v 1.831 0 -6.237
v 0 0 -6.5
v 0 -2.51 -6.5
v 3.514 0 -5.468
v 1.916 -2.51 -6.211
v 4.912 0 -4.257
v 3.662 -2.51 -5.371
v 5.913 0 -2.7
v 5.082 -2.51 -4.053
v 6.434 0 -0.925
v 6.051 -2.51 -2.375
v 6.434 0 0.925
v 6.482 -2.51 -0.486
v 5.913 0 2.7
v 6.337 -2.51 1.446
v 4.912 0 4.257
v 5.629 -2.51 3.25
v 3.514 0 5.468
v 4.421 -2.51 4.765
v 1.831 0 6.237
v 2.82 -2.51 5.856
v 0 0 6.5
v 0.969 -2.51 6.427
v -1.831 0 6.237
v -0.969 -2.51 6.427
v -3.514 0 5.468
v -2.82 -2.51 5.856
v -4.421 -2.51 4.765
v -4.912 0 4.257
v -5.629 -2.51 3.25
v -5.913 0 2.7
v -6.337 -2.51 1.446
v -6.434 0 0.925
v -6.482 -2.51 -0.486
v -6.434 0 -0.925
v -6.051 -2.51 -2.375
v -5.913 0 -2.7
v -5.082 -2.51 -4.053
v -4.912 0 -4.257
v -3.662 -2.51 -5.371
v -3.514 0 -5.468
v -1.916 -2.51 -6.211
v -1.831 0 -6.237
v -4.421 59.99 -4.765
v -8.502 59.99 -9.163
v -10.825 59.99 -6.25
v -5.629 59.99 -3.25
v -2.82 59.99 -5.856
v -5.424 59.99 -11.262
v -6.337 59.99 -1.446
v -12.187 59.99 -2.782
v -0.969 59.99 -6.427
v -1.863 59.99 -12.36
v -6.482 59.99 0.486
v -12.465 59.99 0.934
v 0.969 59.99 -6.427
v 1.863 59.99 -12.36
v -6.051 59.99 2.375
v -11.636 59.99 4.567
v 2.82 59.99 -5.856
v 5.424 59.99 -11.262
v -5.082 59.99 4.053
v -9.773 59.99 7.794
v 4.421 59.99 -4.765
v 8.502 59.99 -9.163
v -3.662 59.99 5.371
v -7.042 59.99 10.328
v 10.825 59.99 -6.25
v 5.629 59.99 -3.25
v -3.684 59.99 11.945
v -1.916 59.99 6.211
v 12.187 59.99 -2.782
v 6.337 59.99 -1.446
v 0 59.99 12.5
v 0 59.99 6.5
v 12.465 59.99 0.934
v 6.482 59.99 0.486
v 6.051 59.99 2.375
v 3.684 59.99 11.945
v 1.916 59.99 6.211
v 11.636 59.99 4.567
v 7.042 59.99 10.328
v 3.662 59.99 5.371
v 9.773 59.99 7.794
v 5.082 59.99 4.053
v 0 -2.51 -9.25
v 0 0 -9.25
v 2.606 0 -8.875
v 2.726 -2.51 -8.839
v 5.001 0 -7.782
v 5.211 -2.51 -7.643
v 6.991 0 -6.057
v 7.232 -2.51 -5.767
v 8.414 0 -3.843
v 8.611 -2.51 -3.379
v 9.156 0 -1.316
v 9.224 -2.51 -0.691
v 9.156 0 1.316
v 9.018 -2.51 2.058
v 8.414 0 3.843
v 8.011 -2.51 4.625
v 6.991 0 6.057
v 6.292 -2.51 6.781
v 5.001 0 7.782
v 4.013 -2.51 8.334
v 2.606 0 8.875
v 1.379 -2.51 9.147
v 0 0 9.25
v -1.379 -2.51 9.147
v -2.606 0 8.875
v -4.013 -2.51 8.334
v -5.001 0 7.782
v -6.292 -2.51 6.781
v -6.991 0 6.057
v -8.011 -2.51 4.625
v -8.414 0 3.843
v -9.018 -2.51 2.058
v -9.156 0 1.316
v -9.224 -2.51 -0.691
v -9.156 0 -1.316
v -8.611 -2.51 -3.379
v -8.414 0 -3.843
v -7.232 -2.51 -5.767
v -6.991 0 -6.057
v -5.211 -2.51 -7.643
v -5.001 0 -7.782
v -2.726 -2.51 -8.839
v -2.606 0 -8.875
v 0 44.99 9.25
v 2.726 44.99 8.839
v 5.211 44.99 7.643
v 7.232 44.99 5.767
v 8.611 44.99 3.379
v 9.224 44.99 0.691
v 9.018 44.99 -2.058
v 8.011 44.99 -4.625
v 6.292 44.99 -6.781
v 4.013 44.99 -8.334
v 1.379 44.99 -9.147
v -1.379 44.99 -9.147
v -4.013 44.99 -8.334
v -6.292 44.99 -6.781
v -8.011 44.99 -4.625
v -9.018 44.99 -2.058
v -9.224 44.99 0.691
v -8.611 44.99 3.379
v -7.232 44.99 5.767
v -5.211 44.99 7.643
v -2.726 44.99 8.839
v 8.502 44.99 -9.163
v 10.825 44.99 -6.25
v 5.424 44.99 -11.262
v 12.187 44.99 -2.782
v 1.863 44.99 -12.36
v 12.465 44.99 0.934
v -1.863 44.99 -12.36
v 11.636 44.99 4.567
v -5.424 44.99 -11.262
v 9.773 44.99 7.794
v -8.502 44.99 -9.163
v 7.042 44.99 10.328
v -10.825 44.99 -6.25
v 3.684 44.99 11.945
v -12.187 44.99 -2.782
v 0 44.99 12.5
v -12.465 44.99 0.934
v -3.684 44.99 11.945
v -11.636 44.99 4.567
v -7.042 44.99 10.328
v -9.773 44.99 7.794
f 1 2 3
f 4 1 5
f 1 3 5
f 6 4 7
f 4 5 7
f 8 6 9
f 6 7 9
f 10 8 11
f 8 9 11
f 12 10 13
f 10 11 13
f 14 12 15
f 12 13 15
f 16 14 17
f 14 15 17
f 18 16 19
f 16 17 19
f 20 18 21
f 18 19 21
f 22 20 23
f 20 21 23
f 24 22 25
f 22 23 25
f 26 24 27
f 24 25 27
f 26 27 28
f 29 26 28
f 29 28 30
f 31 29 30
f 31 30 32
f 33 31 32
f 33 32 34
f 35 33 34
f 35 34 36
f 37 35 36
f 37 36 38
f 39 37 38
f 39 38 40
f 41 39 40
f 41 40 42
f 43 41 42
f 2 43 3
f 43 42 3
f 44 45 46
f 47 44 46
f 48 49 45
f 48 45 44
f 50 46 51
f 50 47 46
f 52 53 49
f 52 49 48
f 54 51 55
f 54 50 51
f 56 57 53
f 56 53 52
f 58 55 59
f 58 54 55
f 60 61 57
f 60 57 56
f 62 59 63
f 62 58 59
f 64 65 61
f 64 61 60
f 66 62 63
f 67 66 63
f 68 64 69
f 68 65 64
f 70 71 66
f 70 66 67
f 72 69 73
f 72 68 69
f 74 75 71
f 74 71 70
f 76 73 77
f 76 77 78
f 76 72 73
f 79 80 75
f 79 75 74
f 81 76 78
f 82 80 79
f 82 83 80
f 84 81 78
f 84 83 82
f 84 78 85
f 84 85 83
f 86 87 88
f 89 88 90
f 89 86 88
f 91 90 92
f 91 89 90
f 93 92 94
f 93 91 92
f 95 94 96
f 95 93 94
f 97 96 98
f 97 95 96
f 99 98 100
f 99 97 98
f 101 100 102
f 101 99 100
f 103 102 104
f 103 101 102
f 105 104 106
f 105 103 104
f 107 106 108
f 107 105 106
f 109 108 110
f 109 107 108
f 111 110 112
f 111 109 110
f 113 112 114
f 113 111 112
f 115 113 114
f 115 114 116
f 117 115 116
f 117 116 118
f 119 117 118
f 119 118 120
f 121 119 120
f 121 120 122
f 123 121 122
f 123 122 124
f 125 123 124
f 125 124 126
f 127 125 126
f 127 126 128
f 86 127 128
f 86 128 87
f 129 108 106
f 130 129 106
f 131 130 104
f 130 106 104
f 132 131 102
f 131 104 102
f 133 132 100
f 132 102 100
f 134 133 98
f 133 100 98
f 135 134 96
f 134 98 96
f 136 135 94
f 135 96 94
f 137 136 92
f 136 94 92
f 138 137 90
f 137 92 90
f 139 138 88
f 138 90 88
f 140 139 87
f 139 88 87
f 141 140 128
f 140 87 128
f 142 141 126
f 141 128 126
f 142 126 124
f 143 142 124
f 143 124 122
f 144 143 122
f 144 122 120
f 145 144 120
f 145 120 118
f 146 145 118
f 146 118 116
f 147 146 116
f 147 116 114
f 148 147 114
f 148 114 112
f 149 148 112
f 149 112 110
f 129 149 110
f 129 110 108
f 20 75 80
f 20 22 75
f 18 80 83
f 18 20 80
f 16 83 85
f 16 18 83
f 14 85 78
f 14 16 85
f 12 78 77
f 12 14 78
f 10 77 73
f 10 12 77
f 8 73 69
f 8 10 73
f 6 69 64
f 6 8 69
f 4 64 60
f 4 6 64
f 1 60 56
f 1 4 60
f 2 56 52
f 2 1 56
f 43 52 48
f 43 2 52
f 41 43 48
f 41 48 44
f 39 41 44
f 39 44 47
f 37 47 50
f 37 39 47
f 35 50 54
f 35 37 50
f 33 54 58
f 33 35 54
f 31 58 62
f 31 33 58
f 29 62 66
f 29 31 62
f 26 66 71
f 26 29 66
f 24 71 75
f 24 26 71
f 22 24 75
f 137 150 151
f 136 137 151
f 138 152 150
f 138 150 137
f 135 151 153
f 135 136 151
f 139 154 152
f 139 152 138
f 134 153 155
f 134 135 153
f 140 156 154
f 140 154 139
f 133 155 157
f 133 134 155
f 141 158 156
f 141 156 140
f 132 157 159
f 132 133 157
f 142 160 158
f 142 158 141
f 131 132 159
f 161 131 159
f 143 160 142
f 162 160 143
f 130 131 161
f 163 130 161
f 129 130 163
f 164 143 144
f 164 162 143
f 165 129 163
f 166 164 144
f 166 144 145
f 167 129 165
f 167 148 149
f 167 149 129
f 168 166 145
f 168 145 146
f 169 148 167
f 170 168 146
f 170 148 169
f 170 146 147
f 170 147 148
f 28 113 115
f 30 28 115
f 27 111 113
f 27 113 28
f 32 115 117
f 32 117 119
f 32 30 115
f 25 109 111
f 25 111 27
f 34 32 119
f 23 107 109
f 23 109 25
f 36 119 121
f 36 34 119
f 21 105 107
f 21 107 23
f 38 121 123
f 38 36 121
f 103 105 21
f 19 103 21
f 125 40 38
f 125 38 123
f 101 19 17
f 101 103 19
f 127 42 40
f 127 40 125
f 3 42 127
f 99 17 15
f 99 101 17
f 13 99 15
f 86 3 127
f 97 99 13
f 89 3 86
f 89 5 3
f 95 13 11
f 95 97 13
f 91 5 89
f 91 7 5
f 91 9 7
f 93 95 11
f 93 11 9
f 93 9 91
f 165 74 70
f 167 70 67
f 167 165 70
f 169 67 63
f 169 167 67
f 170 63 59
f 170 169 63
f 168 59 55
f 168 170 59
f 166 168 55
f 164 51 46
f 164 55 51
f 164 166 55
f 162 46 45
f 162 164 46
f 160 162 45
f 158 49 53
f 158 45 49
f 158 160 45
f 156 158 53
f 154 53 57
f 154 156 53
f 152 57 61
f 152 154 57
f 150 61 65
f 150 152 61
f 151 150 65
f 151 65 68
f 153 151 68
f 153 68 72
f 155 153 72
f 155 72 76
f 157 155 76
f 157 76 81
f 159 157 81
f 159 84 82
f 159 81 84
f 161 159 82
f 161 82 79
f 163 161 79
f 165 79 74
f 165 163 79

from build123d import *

# Parameters (mm, degrees)
SKETCH1_R           = 9.25
SKETCH1_R_2         = 6.5
BOSS_EXTRUDE1_DEPTH = 62.5
BOSS_EXTRUDE2_START = -15
SKETCH3_R           = 12.5
SKETCH3_R_2         = 6.5
BOSS_EXTRUDE2_DEPTH = 15
BOSS_EXTRUDE3_START = 2.51
SKETCH4_R           = 9.25
SKETCH4_R_2         = 6.5
BOSS_EXTRUDE3_DEPTH = 2.51
BOSS_EXTRUDE4_START = 2.51
SKETCH5_R           = 12.5
SKETCH5_R_2         = 9.25
BOSS_EXTRUDE4_DEPTH = 2.51
CUT_EXTRUDE1_START  = -2.51
SKETCH6_R           = 12.5
SKETCH6_R_2         = 6.5
CUT_EXTRUDE1_DEPTH  = 2.51


with BuildPart() as part:
    # Sketch1 → Boss-Extrude1 (new body)
    with BuildSketch(Plane(origin=(0, 0, 0), x_dir=(1, 0, 0), z_dir=(0, 1, 0))):
        with Locations(Location((0, 0, 0), (0, 0, 270))):
            Circle(SKETCH1_R)
        with Locations(Location((0, 0, 0), (0, 0, 270))):
            Circle(SKETCH1_R_2, mode=Mode.SUBTRACT)
    extrude(amount=BOSS_EXTRUDE1_DEPTH)

    # Sketch3 → Boss-Extrude2 (add)
    with BuildSketch(Plane(origin=(0, 62.5, 0), x_dir=(1, 0, 0), z_dir=(0, 1, 0)).offset(BOSS_EXTRUDE2_START)):
        with Locations(Location((0, 0, 0), (0, 0, 270))):
            Circle(SKETCH3_R)
        with Locations(Location((0, 0, 0), (0, 0, 270))):
            Circle(SKETCH3_R_2, mode=Mode.SUBTRACT)
    extrude(amount=BOSS_EXTRUDE2_DEPTH)

    # Sketch4 → Boss-Extrude3 (add)
    with BuildSketch(Plane.XZ.offset(BOSS_EXTRUDE3_START)):
        with Locations(Location((0, 0, 0), (0, 0, 270))):
            Circle(SKETCH4_R)
        with Locations(Location((0, 0, 0), (0, 0, 270))):
            Circle(SKETCH4_R_2, mode=Mode.SUBTRACT)
    extrude(amount=-BOSS_EXTRUDE3_DEPTH)

    # Sketch5 → Boss-Extrude4 (add)
    with BuildSketch(Plane.XZ.offset(-47.5).offset(BOSS_EXTRUDE4_START)):
        with Locations(Location((0, 0, 0), (0, 0, 90))):
            Circle(SKETCH5_R)
        with Locations(Location((0, 0, 0), (0, 0, 270))):
            Circle(SKETCH5_R_2, mode=Mode.SUBTRACT)
    extrude(amount=-BOSS_EXTRUDE4_DEPTH)

    # Sketch6 → Cut-Extrude1 (cut)
    with BuildSketch(Plane(origin=(0, 62.5, 0), x_dir=(1, 0, 0), z_dir=(0, 1, 0)).offset(CUT_EXTRUDE1_START)):
        with Locations(Location((0, 0, 0), (0, 0, 270))):
            Circle(SKETCH6_R)
        with Locations(Location((0, 0, 0), (0, 0, 90))):
            Circle(SKETCH6_R_2, mode=Mode.SUBTRACT)
    extrude(amount=CUT_EXTRUDE1_DEPTH, mode=Mode.SUBTRACT)


solid = part.part
